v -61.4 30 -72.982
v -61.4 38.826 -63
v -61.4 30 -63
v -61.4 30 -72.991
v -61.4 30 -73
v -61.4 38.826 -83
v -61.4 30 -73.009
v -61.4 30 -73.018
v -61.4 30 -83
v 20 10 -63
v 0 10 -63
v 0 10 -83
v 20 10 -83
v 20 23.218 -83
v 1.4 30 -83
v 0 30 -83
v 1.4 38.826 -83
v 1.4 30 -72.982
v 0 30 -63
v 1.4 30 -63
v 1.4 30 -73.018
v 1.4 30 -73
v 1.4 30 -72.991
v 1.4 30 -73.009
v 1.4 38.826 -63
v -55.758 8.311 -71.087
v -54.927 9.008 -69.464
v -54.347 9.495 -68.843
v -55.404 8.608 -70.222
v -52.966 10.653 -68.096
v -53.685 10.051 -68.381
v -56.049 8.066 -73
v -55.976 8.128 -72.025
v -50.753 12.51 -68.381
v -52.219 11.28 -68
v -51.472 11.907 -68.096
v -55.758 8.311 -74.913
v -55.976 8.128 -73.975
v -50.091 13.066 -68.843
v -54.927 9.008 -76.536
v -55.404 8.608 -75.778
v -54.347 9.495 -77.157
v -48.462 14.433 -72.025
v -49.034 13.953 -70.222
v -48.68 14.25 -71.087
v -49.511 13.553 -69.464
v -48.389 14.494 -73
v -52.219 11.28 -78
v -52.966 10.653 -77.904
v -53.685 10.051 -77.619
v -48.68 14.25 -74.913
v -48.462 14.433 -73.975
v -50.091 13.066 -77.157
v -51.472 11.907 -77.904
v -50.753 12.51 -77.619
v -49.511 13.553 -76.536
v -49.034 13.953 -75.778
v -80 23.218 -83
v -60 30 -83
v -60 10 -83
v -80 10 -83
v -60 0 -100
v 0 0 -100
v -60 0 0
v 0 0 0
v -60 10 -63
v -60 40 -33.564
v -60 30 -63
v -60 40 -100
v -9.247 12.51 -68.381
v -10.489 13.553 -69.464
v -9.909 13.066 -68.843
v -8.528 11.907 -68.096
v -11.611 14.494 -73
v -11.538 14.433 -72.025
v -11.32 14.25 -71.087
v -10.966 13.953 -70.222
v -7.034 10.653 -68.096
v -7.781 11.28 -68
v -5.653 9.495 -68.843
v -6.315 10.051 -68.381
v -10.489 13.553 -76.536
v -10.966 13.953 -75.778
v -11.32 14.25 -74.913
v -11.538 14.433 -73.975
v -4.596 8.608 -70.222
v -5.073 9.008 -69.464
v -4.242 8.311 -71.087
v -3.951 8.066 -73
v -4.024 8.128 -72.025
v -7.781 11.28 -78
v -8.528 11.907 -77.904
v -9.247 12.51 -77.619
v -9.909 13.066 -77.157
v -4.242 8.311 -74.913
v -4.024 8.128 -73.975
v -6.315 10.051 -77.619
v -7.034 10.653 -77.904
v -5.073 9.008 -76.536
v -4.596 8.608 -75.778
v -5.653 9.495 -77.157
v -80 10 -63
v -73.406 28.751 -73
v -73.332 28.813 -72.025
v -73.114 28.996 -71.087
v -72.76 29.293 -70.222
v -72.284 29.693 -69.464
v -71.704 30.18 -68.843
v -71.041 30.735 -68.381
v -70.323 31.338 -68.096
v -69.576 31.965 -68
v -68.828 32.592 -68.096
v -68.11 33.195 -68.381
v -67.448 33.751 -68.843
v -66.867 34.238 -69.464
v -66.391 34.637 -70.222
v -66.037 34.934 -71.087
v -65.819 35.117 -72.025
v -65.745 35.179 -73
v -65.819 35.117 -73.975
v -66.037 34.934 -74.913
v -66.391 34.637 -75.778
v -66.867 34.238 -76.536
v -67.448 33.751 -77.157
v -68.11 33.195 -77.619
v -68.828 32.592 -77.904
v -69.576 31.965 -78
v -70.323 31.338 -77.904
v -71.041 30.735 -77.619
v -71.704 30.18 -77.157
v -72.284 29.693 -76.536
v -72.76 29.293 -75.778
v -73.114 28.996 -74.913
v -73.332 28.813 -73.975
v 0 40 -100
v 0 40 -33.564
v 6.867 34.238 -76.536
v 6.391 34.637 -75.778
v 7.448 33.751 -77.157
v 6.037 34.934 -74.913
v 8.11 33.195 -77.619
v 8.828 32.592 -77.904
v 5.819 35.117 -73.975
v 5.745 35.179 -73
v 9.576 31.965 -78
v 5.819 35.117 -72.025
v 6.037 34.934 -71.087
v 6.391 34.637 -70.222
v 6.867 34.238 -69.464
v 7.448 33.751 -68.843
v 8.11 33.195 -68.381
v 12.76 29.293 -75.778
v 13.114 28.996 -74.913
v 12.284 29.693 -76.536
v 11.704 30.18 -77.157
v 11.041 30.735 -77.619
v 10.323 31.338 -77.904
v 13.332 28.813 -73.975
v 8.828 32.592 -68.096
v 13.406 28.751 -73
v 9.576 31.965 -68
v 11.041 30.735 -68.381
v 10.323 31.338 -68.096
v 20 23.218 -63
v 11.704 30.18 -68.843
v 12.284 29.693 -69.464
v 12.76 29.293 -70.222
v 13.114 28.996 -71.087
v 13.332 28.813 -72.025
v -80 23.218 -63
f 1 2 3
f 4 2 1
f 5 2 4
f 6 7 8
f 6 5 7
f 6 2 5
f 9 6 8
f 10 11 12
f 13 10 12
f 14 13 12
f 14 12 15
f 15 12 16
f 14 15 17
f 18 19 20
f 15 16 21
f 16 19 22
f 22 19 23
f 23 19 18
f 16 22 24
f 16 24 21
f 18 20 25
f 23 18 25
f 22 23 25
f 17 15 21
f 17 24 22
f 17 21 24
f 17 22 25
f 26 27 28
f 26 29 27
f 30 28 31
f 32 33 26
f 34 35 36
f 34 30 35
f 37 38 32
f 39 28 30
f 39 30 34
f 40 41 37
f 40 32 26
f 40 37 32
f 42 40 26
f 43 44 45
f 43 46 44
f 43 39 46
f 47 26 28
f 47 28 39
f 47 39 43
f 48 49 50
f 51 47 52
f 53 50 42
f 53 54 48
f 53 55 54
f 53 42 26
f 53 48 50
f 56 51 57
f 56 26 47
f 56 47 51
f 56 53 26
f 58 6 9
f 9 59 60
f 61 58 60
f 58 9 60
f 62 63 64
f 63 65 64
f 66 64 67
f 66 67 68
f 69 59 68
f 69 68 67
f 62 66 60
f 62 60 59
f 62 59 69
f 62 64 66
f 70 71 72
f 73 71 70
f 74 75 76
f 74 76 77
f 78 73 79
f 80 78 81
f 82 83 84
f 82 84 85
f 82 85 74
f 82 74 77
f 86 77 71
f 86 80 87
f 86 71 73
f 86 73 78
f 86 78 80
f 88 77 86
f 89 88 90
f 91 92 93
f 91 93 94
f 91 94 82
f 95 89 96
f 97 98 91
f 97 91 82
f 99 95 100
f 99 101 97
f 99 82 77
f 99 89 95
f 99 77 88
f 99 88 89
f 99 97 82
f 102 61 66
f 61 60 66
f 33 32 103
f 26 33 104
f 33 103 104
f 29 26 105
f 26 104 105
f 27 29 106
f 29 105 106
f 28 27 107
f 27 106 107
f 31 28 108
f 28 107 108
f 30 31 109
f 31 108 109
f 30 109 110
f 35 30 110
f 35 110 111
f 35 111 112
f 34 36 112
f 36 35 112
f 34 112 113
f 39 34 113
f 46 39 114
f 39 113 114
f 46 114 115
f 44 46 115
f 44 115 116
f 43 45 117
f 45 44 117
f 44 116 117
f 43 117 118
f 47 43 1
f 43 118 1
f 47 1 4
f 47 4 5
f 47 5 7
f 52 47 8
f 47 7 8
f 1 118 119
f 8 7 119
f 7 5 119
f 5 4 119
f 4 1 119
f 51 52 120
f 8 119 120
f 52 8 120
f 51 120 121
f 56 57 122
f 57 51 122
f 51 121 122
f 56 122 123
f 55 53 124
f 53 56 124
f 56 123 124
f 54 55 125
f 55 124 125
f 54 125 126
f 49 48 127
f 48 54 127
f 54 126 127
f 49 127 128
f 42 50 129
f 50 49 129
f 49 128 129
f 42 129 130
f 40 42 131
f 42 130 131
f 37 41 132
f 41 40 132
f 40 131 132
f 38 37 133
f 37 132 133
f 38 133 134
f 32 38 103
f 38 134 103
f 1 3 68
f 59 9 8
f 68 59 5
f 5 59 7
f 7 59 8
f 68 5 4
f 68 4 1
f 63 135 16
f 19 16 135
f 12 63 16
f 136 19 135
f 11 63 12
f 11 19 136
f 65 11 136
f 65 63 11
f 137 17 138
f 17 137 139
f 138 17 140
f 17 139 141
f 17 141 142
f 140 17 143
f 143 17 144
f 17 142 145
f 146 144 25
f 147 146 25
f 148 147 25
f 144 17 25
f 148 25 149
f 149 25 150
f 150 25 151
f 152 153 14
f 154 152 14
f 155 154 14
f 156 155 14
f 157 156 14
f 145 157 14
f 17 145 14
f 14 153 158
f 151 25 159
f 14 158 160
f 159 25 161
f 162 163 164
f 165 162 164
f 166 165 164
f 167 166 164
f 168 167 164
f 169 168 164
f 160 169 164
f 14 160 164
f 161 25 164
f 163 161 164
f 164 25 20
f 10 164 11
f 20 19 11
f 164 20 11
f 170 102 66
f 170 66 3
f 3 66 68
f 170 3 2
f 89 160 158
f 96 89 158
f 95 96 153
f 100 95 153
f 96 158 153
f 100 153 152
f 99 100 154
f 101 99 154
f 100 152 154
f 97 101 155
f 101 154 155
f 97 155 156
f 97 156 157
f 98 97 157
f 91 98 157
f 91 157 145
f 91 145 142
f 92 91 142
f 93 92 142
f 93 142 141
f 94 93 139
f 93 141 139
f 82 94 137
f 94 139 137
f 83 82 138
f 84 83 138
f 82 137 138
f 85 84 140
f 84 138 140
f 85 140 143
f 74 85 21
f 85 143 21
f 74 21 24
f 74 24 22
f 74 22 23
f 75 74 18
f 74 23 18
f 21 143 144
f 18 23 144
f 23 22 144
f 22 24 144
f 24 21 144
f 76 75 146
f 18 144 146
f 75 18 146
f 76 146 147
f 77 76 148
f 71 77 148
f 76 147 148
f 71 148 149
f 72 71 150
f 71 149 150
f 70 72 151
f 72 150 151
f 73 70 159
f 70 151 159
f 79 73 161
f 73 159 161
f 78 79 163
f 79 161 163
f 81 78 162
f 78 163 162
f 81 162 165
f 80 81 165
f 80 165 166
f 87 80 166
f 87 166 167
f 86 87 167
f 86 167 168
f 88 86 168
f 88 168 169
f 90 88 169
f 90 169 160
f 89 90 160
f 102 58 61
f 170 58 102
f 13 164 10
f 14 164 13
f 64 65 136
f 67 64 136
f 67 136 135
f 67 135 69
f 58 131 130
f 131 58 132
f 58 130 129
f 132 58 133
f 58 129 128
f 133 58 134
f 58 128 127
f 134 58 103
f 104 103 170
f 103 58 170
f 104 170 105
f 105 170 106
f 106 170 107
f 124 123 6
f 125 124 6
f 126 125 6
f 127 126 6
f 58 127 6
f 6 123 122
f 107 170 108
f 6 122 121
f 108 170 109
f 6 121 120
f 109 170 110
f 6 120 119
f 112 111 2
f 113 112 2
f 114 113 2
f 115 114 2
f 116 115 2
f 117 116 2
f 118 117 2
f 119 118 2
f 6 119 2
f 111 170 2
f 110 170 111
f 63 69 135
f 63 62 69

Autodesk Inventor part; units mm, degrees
ref_plane "YZ Plane" through (0, 0, 0) normal (1, 0, 0) x (0, 1, 0)
ref_plane "XZ Plane" through (0, 0, 0) normal (0, 1, 0) x (-1, 0, 0)
ref_plane "XY Plane" through (0, 0, 0) normal (0, 0, 1) x (1, 0, 0)
sketch "Sketch1" plane through (0, 0, 0) normal (0, 1, 0) x (-1, 0, 0)
  line L0 (0, 0) -> (60, 0)
  line L1 (60, 0) -> (60, -100)
  line L2 (60, -100) -> (0, -100)
  line L3 (0, -100) -> (0, 0)
  dimension "d0" = 100
  dimension "d1" = 60
extrude "Extrusion1" add sketch "Sketch1" along normal blind 40
sketch "Sketch2" plane through (0, 0, 0) normal (1, 0, 0) x (0, 0, -1)
  line L0 (0, 0) -> (37.6485, 44.8677)
  line L1 (0, 0) -> (58.5706, 0) construction
  line L2 (100, 40) -> (0, 40) projected
  line L3 (0, 40) -> (0, 0)
  point P0 (33.564, 40)
  dimension "d4" = 50
extrude "Extrusion2" cut sketch "Sketch2" against normal blind 70
sketch "Sketch3" plane through (0, 0, -100) normal (1, 0, 0) x (0, 0, -1)
  line L0 (0, 0) -> (-17, 0)
  line L1 (-100, 0) -> (0, 0) projected
  line L2 (0, 40) -> (-66.436, 40) projected
  line L3 (-17, 40) -> (-37, 40)
  line L4 (-37, 40) -> (-37, 10)
  line L5 (-37, 10) -> (-17, 10)
  line L6 (-17, 10) -> (-17, 40)
  dimension "d7" = 17
  dimension "d8" = 20
  dimension "d9" = 30
extrude "Extrusion3" add sketch "Sketch3" along normal blind 20
sketch "Sketch4" plane through (0, 10, -63) normal (0, 0, 1) x (1, 0, 0)
  line L0 (0, 30) -> (-60, 30) projected
  line L1 (0, 30) -> (29.4147, 5.3181)
  line L2 (0, 30) -> (38.3982, 30) construction
  line L3 (0, 30) -> (20, 30) projected
  line L4 (0, 30) -> (20, 30)
  line L5 (20, 30) -> (20, 13.218)
  line L6 (20, 0) -> (20, 30) projected
  point P0 (0, -10)
  dimension "d12" = 40
extrude "Extrusion4" cut sketch "Sketch4" against normal blind 61.75
ref_plane "Work Plane1" through (-30, 0, -100) normal (1, 0, 0) x (0, 0, -1)
mirror "Mirror1" about plane through (-30, 0, -100) normal (1, 0, 0) of "Extrusion3", "Extrusion4"
sketch "Sketch5" plane through (0, 40, -63) normal (0.6428, 0.766, 0) x (0.766, -0.6428, 0)
  circle A0 centre (12.5, 10) radius 5
  point P0 (25.7115, -63)
  dimension "d16" = 10
extrude "Extrusion5" cut sketch "Sketch5" against normal blind 27
mirror "Mirror2" about plane through (-30, 0, -100) normal (1, 0, 0) of "Extrusion5"
sketch "Sketch6" plane through (20, 10, -83) normal (0, 0, -1) x (-1, 0, 0)
  line L0 (20, 30) -> (20, 0) projected
  line L1 (20, 30) -> (20, 20)
  line L2 (20, 20) -> (18.6004, 20)
  line L3 (18.6004, 20) -> (18.6004, 28.8256)
  line L4 (0, 13.218) -> (20, 30) projected
  point P0 (20, -10)
  point P1 (20, 20)
  dimension "d19" = 10
extrude "Extrusion6" cut sketch "Sketch6" against normal blind 38.25
mirror "Mirror3" about plane through (-30, 0, -100) normal (1, 0, 0) of "Extrusion6"
properties part number "taslak"
